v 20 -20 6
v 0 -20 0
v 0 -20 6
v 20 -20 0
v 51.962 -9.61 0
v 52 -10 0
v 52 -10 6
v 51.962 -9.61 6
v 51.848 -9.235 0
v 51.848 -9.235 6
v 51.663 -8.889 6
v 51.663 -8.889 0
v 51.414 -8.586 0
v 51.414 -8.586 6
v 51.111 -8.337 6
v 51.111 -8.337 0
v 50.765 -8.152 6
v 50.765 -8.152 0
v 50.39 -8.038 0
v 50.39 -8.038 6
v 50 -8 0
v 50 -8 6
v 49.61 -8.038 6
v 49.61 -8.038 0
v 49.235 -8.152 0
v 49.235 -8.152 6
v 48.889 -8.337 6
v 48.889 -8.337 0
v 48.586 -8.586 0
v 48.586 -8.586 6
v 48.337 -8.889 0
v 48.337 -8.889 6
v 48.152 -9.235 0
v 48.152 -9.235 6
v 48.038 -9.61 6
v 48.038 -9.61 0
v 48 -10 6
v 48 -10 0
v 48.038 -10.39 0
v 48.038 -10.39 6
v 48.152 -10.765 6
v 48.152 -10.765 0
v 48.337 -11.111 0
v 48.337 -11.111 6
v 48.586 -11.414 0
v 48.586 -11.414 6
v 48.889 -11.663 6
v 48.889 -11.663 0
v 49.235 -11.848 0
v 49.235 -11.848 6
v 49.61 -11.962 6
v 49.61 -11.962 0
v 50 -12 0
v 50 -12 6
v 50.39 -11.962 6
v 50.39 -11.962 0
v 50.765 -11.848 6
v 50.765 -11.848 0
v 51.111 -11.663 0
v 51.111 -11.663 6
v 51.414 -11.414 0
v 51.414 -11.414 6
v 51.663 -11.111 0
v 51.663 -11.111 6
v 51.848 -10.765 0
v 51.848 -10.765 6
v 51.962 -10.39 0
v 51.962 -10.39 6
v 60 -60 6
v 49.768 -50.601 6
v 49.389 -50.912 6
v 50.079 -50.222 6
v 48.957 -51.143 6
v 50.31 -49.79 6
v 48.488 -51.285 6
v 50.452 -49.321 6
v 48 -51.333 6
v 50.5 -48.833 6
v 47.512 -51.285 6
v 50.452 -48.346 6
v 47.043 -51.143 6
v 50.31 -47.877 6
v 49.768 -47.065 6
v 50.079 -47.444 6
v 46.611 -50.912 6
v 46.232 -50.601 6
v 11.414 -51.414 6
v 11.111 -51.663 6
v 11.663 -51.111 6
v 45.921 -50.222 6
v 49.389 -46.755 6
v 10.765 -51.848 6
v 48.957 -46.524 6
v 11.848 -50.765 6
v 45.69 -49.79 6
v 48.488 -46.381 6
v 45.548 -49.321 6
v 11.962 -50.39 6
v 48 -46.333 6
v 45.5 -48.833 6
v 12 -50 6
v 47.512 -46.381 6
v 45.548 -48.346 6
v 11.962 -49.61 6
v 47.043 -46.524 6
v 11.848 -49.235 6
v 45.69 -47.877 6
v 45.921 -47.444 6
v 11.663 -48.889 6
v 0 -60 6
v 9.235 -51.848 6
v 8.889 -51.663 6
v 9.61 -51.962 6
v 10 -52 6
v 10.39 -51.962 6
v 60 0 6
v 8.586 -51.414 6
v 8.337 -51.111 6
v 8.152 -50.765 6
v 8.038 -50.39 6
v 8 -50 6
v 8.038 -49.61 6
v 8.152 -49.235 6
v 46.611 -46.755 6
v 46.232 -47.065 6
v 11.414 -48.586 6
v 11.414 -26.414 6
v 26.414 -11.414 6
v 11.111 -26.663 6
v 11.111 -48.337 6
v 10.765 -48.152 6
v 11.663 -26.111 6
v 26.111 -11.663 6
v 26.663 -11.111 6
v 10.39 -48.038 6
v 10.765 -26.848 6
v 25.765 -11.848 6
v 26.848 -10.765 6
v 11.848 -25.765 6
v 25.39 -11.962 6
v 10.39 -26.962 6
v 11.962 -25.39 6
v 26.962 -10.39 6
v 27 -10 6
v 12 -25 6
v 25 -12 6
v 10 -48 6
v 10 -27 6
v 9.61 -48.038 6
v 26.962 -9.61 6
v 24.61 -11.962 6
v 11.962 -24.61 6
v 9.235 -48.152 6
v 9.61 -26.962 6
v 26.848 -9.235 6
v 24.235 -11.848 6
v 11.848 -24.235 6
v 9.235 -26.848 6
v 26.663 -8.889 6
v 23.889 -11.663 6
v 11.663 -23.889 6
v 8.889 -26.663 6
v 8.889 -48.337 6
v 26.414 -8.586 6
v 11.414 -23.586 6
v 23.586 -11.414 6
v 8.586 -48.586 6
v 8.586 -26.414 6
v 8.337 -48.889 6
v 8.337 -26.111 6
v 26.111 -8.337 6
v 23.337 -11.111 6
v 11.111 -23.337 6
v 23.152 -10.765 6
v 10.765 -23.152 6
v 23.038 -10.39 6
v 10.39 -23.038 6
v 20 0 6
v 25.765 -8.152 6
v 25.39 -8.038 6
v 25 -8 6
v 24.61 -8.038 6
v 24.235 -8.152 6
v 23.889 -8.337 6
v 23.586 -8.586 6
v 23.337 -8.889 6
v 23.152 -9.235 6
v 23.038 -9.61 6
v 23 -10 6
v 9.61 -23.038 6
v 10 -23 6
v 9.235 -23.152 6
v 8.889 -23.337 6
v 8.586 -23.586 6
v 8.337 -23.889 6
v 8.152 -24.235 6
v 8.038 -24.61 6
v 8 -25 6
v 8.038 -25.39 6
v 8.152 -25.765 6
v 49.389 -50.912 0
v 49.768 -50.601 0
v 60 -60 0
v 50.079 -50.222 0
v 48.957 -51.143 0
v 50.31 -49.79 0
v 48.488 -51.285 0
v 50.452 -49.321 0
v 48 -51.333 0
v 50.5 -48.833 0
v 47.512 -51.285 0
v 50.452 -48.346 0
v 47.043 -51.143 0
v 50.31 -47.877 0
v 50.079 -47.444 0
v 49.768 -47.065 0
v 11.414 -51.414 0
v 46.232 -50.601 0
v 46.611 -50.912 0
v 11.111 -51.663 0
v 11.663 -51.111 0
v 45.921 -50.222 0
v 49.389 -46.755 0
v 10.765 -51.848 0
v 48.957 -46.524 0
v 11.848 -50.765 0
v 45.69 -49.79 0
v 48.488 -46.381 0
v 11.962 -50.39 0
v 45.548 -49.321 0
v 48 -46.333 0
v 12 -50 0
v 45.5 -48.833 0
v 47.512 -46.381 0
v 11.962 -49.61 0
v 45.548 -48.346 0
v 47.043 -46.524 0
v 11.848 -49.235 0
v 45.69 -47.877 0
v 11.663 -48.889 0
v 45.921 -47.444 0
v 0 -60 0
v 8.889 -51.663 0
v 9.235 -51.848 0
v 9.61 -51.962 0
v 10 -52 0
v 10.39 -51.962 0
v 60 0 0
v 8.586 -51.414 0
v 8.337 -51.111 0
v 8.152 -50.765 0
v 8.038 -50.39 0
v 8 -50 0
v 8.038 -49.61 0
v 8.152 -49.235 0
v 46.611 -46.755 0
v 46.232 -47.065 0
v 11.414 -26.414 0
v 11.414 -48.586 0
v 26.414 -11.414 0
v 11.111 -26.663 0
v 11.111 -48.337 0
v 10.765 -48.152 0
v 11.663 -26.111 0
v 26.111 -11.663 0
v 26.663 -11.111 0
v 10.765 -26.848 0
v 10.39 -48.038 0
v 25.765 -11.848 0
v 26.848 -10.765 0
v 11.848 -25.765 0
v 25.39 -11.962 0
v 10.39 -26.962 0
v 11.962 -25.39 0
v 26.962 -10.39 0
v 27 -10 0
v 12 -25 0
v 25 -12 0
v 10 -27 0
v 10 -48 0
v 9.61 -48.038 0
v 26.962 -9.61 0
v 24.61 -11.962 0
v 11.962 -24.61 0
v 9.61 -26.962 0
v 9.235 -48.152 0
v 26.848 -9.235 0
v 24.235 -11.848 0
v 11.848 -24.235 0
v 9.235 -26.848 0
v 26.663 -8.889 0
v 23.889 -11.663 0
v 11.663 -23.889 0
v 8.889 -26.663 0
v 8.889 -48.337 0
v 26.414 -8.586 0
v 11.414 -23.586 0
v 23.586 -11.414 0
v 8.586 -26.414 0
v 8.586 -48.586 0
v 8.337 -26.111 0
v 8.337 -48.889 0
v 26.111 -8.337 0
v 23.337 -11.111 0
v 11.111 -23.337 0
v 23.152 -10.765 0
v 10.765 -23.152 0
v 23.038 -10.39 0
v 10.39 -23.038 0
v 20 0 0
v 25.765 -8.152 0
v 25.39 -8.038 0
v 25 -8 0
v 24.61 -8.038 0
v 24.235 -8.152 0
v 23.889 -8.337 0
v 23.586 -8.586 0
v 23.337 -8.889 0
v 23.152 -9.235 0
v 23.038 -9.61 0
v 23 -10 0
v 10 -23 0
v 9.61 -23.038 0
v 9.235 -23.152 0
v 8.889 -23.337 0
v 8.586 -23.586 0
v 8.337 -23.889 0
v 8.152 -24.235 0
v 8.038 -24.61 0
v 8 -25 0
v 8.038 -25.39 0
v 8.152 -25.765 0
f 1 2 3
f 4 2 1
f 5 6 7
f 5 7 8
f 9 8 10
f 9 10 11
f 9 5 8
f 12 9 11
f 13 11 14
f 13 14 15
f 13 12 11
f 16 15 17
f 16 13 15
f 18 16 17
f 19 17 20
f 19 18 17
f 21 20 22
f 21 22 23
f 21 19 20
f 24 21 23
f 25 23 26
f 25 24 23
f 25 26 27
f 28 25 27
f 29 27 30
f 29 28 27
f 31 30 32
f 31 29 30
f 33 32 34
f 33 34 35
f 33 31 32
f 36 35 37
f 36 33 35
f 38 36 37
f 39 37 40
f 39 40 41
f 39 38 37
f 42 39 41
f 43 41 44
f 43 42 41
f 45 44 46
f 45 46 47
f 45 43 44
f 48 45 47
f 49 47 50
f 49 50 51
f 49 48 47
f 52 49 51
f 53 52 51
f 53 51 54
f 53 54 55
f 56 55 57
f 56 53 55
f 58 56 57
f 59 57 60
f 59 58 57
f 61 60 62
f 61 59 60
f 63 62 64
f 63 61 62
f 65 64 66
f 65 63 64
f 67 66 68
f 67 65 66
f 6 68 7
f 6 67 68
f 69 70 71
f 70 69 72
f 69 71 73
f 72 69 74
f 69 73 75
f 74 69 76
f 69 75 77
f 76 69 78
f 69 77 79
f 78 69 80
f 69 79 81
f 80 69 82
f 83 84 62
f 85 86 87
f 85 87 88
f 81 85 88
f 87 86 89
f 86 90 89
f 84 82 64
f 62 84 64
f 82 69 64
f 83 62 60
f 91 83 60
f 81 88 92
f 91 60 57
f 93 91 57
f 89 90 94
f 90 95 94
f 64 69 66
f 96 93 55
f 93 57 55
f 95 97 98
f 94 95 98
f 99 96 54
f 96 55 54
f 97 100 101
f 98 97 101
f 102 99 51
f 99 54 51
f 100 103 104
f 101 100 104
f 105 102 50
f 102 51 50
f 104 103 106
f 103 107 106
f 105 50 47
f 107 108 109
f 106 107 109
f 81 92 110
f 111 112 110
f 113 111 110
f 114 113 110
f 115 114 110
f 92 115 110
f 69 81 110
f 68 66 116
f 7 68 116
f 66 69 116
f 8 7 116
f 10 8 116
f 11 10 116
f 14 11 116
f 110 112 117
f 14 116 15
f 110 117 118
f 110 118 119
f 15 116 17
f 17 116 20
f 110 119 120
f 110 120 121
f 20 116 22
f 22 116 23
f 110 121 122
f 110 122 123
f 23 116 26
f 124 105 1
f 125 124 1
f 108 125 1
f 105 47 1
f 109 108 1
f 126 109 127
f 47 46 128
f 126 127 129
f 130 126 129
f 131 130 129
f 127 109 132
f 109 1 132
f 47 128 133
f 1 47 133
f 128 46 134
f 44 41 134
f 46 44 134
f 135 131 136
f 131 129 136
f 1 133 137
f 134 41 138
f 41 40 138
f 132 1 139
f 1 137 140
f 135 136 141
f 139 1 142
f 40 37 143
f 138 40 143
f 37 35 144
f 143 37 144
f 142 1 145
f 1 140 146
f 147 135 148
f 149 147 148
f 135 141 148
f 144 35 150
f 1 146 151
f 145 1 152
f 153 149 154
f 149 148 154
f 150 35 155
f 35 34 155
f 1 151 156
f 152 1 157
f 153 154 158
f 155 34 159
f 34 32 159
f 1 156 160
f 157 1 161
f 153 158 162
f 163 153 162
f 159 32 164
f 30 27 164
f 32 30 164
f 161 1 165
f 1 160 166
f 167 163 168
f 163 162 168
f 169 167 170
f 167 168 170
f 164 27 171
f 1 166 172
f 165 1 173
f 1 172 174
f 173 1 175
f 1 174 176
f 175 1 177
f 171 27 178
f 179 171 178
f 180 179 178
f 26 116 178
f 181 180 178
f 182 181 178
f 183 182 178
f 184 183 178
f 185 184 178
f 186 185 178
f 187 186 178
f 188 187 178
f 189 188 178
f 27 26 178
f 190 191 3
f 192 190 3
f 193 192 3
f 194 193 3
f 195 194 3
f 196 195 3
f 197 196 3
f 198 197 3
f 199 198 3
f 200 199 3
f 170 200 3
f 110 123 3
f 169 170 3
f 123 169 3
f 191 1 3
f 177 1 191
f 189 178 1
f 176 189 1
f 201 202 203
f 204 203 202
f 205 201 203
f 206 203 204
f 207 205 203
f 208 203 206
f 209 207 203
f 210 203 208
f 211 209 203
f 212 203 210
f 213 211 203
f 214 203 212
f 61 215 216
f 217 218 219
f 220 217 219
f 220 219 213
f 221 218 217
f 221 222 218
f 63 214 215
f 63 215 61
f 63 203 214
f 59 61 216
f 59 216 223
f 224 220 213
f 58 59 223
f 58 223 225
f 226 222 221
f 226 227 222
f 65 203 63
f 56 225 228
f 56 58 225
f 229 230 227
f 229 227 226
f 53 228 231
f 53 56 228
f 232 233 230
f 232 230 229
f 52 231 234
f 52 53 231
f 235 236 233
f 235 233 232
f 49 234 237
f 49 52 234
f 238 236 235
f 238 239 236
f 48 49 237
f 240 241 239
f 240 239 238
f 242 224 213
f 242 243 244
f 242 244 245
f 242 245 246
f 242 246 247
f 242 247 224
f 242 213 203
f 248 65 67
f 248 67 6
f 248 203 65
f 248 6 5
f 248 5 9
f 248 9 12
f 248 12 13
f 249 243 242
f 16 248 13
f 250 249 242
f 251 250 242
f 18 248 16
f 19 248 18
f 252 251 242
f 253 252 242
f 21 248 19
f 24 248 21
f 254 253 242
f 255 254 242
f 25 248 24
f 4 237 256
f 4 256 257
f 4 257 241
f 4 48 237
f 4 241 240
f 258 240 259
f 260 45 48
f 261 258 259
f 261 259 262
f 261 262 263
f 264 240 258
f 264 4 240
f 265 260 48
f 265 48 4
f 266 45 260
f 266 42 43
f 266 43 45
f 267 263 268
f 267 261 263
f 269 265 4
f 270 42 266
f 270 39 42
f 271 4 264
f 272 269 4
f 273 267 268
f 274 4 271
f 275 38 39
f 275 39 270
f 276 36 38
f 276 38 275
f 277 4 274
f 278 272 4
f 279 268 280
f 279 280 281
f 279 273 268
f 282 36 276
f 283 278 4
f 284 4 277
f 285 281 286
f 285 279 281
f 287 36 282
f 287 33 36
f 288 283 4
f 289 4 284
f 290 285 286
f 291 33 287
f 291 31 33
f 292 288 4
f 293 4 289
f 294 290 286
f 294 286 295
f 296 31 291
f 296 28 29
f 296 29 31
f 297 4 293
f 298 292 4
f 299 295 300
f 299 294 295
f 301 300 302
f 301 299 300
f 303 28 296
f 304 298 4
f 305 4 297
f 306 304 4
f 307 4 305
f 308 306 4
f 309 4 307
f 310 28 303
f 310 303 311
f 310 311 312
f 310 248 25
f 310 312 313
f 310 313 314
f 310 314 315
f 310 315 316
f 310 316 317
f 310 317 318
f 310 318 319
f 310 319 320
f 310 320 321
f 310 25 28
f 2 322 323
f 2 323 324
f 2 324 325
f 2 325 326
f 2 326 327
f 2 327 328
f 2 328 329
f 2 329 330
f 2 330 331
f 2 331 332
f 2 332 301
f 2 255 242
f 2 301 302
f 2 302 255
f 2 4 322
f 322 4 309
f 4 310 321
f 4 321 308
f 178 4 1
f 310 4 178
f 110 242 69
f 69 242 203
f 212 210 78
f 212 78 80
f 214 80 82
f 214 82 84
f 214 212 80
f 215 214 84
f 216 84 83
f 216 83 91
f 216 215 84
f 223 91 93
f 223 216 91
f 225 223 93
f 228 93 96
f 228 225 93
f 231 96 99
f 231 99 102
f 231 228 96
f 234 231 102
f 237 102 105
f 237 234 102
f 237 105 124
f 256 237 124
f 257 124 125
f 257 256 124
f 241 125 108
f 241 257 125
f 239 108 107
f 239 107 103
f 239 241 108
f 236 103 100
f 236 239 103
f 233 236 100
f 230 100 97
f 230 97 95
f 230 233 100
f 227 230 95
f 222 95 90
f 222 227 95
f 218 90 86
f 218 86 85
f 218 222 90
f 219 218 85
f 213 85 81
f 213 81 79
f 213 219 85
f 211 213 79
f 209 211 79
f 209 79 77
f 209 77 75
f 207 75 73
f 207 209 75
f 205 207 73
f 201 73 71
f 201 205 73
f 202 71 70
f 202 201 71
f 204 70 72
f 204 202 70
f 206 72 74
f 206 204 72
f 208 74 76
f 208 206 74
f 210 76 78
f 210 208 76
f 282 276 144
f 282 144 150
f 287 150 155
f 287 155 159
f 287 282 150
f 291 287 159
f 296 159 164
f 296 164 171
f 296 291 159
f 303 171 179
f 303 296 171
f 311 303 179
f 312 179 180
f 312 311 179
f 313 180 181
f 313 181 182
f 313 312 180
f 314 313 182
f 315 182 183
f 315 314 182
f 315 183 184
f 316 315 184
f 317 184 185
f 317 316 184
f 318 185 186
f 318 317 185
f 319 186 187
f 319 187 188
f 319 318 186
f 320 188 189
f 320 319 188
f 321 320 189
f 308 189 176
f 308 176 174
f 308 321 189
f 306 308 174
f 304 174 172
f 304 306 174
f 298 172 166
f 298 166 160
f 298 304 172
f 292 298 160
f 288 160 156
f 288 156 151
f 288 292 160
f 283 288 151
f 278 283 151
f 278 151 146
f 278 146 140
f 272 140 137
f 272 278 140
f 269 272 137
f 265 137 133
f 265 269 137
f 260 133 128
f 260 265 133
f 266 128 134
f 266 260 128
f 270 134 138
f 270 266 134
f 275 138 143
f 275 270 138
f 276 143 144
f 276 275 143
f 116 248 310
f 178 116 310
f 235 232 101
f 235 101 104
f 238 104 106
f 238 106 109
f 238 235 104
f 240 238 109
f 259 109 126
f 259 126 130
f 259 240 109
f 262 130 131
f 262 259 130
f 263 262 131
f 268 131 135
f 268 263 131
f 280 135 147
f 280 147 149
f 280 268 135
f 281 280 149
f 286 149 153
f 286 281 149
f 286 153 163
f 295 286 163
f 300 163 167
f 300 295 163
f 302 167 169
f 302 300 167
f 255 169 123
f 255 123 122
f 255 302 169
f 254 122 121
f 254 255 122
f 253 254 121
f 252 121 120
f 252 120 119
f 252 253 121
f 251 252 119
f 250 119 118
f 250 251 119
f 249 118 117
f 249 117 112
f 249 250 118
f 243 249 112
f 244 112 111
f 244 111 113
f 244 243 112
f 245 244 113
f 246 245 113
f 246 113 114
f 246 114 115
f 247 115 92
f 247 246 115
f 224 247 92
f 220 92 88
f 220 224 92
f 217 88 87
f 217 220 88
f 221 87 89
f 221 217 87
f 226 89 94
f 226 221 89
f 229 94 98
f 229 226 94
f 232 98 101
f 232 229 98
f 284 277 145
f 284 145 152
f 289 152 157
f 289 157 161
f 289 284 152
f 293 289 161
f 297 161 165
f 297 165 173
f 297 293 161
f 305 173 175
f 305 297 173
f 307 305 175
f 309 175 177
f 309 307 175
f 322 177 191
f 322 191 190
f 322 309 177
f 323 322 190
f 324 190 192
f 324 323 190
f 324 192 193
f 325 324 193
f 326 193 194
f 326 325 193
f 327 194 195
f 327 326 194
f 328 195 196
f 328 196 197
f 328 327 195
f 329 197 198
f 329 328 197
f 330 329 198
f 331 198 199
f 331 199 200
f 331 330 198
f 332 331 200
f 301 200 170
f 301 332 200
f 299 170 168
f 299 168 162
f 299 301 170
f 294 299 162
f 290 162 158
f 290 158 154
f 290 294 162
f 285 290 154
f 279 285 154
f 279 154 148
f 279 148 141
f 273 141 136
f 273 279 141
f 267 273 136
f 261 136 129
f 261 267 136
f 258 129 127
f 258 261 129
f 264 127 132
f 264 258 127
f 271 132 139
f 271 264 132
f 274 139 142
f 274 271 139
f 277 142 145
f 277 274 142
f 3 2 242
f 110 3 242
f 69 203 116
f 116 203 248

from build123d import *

# Parameters (mm, degrees)
SKETCH1_R           = 2
SKETCH1_R_2         = 2.5
BOSS_EXTRUDE1_DEPTH = 6


with BuildPart() as part:
    # Sketch1 → Boss-Extrude1 (new body)
    with BuildSketch(Plane.XY):
        Polygon((29.343145751, 0), (60, 0), (60, -20), (60, -60), (20, -60), (0, -60), (0, -29.343145751), (0, -20), (20, -20), (20, 0), align=None)
        with Locations((50, -10)):
            Circle(SKETCH1_R, mode=Mode.SUBTRACT)
        with Locations((25, -10)):
            Circle(SKETCH1_R, mode=Mode.SUBTRACT)
        with Locations((10, -50)):
            Circle(SKETCH1_R, mode=Mode.SUBTRACT)
        with Locations((10, -25)):
            Circle(SKETCH1_R, mode=Mode.SUBTRACT)
        with Locations((48, -48.833248844)):
            Circle(SKETCH1_R_2, mode=Mode.SUBTRACT)
    extrude(amount=BOSS_EXTRUDE1_DEPTH)


solid = part.part
